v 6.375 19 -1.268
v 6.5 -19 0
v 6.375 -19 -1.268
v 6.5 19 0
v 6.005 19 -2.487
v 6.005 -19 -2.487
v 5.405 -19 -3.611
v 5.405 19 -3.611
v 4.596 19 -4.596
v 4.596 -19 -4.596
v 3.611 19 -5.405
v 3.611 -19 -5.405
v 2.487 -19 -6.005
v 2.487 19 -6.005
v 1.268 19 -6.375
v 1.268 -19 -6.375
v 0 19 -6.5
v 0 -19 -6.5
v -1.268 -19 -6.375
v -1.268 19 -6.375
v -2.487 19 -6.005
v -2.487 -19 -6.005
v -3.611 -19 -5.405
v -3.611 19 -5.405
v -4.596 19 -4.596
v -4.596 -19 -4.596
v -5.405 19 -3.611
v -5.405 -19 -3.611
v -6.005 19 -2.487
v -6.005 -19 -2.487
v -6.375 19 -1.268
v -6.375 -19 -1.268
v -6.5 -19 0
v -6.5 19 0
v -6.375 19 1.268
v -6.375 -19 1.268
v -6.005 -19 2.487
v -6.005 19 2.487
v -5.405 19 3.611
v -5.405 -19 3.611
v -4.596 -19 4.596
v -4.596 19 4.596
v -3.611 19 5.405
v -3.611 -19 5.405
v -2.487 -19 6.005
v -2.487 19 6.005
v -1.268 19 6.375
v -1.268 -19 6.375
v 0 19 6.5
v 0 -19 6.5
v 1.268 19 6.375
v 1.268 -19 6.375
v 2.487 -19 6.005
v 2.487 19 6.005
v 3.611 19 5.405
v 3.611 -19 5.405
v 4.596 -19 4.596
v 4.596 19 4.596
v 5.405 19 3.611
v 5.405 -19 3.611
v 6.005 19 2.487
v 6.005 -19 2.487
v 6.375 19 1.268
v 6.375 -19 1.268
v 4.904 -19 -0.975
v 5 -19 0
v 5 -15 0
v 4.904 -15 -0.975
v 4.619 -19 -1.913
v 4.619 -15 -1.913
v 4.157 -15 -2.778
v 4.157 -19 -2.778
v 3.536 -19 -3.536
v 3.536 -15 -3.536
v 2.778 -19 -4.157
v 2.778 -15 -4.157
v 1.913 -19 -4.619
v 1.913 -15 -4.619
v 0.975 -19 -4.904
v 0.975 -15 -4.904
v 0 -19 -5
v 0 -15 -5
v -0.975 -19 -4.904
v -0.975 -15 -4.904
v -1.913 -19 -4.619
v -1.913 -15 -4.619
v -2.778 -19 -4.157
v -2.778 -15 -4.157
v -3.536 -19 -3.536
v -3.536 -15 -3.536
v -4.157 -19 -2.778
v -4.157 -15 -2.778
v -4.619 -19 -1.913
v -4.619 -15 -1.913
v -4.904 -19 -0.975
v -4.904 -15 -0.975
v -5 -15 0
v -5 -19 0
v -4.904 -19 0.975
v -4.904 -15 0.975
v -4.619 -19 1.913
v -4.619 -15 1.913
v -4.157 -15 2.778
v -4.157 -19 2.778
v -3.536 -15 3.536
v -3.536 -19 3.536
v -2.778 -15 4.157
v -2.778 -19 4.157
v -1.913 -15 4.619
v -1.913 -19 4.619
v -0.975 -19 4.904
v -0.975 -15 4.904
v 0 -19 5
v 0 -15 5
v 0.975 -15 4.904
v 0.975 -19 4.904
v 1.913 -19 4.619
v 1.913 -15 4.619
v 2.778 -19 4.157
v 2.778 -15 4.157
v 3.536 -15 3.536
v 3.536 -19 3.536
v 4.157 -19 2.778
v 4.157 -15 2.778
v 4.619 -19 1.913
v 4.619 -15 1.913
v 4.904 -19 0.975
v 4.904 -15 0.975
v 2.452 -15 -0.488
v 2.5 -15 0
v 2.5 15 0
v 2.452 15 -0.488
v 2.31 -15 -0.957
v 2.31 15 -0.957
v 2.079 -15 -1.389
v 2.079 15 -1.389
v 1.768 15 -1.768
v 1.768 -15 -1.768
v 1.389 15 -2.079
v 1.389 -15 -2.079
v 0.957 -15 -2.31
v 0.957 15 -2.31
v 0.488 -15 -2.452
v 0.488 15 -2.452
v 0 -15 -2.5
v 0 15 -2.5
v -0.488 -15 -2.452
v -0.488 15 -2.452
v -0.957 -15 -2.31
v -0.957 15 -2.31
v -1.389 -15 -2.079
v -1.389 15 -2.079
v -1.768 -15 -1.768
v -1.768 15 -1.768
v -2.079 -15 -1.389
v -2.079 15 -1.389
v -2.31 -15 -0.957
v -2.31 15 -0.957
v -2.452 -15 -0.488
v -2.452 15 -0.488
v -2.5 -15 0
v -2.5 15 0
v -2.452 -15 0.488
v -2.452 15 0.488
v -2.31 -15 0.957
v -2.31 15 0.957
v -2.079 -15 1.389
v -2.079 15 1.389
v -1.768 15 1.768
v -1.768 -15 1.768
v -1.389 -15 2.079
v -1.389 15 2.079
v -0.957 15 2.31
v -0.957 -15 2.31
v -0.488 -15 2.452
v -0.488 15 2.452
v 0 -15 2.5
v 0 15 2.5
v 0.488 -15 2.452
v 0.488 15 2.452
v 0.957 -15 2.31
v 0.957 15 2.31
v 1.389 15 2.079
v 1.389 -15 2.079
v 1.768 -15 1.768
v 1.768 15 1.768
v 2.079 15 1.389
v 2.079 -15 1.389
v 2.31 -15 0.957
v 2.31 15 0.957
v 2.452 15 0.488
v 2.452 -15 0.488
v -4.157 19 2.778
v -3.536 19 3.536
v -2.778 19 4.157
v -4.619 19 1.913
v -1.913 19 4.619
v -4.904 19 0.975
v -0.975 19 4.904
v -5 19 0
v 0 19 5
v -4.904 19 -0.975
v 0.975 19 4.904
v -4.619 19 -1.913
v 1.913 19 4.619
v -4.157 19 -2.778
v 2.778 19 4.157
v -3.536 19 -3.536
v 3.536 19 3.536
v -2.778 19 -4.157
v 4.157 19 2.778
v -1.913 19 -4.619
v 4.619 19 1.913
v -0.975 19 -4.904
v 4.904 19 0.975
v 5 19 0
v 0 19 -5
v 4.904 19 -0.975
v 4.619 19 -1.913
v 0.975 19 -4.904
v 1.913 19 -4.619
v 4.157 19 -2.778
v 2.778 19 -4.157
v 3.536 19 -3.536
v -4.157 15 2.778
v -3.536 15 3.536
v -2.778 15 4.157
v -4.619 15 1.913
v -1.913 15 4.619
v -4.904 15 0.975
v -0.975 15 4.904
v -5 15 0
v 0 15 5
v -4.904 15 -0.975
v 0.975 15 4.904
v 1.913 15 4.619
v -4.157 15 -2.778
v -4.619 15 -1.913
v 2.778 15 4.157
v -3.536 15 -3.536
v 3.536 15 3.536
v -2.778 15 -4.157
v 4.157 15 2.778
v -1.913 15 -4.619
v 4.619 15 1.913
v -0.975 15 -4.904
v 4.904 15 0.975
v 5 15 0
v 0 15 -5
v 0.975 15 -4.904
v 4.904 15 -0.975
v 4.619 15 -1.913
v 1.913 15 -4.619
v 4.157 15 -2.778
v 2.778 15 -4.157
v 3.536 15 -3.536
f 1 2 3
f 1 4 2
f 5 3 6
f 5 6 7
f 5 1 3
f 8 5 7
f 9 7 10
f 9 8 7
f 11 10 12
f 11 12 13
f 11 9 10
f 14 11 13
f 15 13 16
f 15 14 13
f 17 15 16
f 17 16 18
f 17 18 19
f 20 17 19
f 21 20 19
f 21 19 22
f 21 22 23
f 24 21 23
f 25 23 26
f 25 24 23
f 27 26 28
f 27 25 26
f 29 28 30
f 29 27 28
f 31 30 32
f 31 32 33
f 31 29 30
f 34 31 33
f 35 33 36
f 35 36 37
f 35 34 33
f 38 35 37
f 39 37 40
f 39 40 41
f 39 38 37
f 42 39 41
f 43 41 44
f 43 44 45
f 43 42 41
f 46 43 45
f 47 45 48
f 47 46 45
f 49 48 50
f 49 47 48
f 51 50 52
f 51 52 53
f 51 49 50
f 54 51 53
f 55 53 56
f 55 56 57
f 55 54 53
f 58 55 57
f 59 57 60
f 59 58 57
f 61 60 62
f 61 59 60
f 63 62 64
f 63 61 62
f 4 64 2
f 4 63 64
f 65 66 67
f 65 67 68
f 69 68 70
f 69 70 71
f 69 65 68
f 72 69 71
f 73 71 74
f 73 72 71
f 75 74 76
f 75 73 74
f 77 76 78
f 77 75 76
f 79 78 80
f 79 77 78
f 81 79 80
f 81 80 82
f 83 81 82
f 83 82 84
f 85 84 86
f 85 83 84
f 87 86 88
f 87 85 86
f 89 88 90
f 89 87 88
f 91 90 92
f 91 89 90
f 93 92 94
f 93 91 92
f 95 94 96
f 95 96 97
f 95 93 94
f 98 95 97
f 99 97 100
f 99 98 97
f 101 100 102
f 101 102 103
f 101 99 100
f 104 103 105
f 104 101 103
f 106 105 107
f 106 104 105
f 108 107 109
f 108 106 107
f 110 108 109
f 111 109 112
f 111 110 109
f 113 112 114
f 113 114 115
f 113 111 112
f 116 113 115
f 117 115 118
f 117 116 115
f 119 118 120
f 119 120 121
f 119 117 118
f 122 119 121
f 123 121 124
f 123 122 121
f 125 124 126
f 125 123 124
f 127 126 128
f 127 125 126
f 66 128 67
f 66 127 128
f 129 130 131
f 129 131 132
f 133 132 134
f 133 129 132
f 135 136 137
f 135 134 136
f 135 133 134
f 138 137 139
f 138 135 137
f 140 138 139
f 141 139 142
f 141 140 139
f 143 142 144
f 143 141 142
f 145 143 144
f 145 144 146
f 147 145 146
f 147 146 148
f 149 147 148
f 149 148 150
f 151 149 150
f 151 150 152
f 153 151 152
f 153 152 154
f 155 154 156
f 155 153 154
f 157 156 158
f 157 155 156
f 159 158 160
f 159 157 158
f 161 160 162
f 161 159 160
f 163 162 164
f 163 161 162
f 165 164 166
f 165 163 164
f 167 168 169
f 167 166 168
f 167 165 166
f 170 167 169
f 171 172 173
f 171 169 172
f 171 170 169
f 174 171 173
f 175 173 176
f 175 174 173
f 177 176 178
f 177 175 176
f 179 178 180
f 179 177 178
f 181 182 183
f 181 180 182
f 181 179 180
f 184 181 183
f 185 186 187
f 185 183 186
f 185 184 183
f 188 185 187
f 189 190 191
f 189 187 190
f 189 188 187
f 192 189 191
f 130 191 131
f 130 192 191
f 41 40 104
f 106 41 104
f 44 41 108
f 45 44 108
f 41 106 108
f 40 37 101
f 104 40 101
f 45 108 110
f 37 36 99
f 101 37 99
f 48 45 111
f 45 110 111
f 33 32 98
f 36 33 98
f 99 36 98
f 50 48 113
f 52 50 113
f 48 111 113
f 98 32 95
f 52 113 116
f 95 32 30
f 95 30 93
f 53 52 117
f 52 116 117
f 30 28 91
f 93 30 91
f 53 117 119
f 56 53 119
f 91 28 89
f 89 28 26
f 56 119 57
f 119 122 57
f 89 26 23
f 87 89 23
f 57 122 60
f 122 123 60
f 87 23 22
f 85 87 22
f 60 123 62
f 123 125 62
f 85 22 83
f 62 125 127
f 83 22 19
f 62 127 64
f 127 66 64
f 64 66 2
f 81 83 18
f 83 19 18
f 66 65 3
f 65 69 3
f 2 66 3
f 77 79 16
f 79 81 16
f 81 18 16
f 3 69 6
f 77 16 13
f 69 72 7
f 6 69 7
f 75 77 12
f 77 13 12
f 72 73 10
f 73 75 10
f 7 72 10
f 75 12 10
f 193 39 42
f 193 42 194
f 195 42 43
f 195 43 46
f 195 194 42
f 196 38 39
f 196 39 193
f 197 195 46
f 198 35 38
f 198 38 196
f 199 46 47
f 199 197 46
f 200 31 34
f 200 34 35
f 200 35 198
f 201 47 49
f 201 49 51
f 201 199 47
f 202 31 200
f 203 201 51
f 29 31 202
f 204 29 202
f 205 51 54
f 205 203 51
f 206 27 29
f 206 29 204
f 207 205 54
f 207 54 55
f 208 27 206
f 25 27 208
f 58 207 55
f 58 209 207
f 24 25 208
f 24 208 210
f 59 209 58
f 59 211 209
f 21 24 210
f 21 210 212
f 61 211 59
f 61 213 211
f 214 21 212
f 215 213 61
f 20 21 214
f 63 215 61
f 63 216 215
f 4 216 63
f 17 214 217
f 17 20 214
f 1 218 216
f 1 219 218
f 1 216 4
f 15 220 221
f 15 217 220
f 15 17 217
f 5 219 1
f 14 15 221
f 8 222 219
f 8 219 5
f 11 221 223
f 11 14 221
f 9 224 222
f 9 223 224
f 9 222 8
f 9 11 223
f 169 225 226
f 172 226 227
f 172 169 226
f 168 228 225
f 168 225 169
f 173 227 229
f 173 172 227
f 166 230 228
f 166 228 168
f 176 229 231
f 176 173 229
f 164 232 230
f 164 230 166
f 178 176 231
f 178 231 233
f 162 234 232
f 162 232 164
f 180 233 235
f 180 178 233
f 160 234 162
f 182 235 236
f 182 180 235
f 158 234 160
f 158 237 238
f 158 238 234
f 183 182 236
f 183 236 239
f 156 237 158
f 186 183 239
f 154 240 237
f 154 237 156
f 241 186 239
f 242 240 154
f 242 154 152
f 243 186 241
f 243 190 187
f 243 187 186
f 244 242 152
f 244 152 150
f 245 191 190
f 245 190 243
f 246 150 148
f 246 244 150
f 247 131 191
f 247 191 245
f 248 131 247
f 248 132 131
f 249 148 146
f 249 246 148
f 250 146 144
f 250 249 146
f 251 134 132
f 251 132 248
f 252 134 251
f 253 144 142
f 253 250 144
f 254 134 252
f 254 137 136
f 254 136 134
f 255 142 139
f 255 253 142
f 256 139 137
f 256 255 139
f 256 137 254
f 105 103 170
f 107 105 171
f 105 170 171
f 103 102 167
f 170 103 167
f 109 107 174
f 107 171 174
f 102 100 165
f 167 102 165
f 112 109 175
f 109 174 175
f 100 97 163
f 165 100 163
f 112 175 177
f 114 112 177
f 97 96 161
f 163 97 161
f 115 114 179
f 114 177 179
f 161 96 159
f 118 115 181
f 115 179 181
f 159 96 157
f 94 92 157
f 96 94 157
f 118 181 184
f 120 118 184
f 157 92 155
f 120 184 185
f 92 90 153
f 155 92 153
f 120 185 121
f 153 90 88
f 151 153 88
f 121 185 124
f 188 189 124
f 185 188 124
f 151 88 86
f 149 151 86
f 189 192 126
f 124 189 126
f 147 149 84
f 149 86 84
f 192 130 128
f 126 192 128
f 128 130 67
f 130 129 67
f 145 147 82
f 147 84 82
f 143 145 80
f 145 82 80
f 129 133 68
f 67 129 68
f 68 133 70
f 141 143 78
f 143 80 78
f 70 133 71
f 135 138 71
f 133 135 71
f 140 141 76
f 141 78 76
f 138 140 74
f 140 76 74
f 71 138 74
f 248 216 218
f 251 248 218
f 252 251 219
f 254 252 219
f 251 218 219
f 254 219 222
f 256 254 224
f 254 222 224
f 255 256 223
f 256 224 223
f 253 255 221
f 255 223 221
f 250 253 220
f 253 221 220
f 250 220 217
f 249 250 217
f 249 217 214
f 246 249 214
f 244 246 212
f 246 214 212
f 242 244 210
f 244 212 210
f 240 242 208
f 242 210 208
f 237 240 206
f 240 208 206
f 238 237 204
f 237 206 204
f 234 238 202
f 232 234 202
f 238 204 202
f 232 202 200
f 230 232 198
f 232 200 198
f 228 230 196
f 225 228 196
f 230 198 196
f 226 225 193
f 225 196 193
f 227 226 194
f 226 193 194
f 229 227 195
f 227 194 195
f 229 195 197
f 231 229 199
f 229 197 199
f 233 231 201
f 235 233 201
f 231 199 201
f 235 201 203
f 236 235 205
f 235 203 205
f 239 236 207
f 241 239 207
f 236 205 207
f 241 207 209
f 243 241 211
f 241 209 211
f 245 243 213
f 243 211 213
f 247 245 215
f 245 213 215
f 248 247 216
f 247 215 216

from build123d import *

# Parameters (mm, degrees)
SKETCH_1_R          = 6.5
SKETCH_1_R_2        = 2.5
EXTRUDE_2_DEPTH     = 19
SKETCH_2_R          = 5
CUT_EXTRUDE_1_DEPTH = 4


with BuildPart() as part:
    # 草图1 → 凸台-拉伸2 (new body, symmetric)
    with BuildSketch(Plane(origin=(0, 0, 0), x_dir=(1, 0, 0), z_dir=(0, 1, 0))):
        Circle(SKETCH_1_R)
        Circle(SKETCH_1_R_2, mode=Mode.SUBTRACT)
    extrude(amount=EXTRUDE_2_DEPTH, both=True)

    # 草图2 → 切除-拉伸1 (cut)
    with BuildSketch(Plane(origin=(0, 19, 0), x_dir=(1, 0, 0), z_dir=(0, 1, 0))):
        Circle(SKETCH_2_R)
    cut_extrude_1 = extrude(amount=-CUT_EXTRUDE_1_DEPTH, mode=Mode.SUBTRACT)

    # 镜向1: 切除-拉伸1 across plane
    add(cut_extrude_1.mirror(Plane.ZX), mode=Mode.SUBTRACT)


solid = part.part
